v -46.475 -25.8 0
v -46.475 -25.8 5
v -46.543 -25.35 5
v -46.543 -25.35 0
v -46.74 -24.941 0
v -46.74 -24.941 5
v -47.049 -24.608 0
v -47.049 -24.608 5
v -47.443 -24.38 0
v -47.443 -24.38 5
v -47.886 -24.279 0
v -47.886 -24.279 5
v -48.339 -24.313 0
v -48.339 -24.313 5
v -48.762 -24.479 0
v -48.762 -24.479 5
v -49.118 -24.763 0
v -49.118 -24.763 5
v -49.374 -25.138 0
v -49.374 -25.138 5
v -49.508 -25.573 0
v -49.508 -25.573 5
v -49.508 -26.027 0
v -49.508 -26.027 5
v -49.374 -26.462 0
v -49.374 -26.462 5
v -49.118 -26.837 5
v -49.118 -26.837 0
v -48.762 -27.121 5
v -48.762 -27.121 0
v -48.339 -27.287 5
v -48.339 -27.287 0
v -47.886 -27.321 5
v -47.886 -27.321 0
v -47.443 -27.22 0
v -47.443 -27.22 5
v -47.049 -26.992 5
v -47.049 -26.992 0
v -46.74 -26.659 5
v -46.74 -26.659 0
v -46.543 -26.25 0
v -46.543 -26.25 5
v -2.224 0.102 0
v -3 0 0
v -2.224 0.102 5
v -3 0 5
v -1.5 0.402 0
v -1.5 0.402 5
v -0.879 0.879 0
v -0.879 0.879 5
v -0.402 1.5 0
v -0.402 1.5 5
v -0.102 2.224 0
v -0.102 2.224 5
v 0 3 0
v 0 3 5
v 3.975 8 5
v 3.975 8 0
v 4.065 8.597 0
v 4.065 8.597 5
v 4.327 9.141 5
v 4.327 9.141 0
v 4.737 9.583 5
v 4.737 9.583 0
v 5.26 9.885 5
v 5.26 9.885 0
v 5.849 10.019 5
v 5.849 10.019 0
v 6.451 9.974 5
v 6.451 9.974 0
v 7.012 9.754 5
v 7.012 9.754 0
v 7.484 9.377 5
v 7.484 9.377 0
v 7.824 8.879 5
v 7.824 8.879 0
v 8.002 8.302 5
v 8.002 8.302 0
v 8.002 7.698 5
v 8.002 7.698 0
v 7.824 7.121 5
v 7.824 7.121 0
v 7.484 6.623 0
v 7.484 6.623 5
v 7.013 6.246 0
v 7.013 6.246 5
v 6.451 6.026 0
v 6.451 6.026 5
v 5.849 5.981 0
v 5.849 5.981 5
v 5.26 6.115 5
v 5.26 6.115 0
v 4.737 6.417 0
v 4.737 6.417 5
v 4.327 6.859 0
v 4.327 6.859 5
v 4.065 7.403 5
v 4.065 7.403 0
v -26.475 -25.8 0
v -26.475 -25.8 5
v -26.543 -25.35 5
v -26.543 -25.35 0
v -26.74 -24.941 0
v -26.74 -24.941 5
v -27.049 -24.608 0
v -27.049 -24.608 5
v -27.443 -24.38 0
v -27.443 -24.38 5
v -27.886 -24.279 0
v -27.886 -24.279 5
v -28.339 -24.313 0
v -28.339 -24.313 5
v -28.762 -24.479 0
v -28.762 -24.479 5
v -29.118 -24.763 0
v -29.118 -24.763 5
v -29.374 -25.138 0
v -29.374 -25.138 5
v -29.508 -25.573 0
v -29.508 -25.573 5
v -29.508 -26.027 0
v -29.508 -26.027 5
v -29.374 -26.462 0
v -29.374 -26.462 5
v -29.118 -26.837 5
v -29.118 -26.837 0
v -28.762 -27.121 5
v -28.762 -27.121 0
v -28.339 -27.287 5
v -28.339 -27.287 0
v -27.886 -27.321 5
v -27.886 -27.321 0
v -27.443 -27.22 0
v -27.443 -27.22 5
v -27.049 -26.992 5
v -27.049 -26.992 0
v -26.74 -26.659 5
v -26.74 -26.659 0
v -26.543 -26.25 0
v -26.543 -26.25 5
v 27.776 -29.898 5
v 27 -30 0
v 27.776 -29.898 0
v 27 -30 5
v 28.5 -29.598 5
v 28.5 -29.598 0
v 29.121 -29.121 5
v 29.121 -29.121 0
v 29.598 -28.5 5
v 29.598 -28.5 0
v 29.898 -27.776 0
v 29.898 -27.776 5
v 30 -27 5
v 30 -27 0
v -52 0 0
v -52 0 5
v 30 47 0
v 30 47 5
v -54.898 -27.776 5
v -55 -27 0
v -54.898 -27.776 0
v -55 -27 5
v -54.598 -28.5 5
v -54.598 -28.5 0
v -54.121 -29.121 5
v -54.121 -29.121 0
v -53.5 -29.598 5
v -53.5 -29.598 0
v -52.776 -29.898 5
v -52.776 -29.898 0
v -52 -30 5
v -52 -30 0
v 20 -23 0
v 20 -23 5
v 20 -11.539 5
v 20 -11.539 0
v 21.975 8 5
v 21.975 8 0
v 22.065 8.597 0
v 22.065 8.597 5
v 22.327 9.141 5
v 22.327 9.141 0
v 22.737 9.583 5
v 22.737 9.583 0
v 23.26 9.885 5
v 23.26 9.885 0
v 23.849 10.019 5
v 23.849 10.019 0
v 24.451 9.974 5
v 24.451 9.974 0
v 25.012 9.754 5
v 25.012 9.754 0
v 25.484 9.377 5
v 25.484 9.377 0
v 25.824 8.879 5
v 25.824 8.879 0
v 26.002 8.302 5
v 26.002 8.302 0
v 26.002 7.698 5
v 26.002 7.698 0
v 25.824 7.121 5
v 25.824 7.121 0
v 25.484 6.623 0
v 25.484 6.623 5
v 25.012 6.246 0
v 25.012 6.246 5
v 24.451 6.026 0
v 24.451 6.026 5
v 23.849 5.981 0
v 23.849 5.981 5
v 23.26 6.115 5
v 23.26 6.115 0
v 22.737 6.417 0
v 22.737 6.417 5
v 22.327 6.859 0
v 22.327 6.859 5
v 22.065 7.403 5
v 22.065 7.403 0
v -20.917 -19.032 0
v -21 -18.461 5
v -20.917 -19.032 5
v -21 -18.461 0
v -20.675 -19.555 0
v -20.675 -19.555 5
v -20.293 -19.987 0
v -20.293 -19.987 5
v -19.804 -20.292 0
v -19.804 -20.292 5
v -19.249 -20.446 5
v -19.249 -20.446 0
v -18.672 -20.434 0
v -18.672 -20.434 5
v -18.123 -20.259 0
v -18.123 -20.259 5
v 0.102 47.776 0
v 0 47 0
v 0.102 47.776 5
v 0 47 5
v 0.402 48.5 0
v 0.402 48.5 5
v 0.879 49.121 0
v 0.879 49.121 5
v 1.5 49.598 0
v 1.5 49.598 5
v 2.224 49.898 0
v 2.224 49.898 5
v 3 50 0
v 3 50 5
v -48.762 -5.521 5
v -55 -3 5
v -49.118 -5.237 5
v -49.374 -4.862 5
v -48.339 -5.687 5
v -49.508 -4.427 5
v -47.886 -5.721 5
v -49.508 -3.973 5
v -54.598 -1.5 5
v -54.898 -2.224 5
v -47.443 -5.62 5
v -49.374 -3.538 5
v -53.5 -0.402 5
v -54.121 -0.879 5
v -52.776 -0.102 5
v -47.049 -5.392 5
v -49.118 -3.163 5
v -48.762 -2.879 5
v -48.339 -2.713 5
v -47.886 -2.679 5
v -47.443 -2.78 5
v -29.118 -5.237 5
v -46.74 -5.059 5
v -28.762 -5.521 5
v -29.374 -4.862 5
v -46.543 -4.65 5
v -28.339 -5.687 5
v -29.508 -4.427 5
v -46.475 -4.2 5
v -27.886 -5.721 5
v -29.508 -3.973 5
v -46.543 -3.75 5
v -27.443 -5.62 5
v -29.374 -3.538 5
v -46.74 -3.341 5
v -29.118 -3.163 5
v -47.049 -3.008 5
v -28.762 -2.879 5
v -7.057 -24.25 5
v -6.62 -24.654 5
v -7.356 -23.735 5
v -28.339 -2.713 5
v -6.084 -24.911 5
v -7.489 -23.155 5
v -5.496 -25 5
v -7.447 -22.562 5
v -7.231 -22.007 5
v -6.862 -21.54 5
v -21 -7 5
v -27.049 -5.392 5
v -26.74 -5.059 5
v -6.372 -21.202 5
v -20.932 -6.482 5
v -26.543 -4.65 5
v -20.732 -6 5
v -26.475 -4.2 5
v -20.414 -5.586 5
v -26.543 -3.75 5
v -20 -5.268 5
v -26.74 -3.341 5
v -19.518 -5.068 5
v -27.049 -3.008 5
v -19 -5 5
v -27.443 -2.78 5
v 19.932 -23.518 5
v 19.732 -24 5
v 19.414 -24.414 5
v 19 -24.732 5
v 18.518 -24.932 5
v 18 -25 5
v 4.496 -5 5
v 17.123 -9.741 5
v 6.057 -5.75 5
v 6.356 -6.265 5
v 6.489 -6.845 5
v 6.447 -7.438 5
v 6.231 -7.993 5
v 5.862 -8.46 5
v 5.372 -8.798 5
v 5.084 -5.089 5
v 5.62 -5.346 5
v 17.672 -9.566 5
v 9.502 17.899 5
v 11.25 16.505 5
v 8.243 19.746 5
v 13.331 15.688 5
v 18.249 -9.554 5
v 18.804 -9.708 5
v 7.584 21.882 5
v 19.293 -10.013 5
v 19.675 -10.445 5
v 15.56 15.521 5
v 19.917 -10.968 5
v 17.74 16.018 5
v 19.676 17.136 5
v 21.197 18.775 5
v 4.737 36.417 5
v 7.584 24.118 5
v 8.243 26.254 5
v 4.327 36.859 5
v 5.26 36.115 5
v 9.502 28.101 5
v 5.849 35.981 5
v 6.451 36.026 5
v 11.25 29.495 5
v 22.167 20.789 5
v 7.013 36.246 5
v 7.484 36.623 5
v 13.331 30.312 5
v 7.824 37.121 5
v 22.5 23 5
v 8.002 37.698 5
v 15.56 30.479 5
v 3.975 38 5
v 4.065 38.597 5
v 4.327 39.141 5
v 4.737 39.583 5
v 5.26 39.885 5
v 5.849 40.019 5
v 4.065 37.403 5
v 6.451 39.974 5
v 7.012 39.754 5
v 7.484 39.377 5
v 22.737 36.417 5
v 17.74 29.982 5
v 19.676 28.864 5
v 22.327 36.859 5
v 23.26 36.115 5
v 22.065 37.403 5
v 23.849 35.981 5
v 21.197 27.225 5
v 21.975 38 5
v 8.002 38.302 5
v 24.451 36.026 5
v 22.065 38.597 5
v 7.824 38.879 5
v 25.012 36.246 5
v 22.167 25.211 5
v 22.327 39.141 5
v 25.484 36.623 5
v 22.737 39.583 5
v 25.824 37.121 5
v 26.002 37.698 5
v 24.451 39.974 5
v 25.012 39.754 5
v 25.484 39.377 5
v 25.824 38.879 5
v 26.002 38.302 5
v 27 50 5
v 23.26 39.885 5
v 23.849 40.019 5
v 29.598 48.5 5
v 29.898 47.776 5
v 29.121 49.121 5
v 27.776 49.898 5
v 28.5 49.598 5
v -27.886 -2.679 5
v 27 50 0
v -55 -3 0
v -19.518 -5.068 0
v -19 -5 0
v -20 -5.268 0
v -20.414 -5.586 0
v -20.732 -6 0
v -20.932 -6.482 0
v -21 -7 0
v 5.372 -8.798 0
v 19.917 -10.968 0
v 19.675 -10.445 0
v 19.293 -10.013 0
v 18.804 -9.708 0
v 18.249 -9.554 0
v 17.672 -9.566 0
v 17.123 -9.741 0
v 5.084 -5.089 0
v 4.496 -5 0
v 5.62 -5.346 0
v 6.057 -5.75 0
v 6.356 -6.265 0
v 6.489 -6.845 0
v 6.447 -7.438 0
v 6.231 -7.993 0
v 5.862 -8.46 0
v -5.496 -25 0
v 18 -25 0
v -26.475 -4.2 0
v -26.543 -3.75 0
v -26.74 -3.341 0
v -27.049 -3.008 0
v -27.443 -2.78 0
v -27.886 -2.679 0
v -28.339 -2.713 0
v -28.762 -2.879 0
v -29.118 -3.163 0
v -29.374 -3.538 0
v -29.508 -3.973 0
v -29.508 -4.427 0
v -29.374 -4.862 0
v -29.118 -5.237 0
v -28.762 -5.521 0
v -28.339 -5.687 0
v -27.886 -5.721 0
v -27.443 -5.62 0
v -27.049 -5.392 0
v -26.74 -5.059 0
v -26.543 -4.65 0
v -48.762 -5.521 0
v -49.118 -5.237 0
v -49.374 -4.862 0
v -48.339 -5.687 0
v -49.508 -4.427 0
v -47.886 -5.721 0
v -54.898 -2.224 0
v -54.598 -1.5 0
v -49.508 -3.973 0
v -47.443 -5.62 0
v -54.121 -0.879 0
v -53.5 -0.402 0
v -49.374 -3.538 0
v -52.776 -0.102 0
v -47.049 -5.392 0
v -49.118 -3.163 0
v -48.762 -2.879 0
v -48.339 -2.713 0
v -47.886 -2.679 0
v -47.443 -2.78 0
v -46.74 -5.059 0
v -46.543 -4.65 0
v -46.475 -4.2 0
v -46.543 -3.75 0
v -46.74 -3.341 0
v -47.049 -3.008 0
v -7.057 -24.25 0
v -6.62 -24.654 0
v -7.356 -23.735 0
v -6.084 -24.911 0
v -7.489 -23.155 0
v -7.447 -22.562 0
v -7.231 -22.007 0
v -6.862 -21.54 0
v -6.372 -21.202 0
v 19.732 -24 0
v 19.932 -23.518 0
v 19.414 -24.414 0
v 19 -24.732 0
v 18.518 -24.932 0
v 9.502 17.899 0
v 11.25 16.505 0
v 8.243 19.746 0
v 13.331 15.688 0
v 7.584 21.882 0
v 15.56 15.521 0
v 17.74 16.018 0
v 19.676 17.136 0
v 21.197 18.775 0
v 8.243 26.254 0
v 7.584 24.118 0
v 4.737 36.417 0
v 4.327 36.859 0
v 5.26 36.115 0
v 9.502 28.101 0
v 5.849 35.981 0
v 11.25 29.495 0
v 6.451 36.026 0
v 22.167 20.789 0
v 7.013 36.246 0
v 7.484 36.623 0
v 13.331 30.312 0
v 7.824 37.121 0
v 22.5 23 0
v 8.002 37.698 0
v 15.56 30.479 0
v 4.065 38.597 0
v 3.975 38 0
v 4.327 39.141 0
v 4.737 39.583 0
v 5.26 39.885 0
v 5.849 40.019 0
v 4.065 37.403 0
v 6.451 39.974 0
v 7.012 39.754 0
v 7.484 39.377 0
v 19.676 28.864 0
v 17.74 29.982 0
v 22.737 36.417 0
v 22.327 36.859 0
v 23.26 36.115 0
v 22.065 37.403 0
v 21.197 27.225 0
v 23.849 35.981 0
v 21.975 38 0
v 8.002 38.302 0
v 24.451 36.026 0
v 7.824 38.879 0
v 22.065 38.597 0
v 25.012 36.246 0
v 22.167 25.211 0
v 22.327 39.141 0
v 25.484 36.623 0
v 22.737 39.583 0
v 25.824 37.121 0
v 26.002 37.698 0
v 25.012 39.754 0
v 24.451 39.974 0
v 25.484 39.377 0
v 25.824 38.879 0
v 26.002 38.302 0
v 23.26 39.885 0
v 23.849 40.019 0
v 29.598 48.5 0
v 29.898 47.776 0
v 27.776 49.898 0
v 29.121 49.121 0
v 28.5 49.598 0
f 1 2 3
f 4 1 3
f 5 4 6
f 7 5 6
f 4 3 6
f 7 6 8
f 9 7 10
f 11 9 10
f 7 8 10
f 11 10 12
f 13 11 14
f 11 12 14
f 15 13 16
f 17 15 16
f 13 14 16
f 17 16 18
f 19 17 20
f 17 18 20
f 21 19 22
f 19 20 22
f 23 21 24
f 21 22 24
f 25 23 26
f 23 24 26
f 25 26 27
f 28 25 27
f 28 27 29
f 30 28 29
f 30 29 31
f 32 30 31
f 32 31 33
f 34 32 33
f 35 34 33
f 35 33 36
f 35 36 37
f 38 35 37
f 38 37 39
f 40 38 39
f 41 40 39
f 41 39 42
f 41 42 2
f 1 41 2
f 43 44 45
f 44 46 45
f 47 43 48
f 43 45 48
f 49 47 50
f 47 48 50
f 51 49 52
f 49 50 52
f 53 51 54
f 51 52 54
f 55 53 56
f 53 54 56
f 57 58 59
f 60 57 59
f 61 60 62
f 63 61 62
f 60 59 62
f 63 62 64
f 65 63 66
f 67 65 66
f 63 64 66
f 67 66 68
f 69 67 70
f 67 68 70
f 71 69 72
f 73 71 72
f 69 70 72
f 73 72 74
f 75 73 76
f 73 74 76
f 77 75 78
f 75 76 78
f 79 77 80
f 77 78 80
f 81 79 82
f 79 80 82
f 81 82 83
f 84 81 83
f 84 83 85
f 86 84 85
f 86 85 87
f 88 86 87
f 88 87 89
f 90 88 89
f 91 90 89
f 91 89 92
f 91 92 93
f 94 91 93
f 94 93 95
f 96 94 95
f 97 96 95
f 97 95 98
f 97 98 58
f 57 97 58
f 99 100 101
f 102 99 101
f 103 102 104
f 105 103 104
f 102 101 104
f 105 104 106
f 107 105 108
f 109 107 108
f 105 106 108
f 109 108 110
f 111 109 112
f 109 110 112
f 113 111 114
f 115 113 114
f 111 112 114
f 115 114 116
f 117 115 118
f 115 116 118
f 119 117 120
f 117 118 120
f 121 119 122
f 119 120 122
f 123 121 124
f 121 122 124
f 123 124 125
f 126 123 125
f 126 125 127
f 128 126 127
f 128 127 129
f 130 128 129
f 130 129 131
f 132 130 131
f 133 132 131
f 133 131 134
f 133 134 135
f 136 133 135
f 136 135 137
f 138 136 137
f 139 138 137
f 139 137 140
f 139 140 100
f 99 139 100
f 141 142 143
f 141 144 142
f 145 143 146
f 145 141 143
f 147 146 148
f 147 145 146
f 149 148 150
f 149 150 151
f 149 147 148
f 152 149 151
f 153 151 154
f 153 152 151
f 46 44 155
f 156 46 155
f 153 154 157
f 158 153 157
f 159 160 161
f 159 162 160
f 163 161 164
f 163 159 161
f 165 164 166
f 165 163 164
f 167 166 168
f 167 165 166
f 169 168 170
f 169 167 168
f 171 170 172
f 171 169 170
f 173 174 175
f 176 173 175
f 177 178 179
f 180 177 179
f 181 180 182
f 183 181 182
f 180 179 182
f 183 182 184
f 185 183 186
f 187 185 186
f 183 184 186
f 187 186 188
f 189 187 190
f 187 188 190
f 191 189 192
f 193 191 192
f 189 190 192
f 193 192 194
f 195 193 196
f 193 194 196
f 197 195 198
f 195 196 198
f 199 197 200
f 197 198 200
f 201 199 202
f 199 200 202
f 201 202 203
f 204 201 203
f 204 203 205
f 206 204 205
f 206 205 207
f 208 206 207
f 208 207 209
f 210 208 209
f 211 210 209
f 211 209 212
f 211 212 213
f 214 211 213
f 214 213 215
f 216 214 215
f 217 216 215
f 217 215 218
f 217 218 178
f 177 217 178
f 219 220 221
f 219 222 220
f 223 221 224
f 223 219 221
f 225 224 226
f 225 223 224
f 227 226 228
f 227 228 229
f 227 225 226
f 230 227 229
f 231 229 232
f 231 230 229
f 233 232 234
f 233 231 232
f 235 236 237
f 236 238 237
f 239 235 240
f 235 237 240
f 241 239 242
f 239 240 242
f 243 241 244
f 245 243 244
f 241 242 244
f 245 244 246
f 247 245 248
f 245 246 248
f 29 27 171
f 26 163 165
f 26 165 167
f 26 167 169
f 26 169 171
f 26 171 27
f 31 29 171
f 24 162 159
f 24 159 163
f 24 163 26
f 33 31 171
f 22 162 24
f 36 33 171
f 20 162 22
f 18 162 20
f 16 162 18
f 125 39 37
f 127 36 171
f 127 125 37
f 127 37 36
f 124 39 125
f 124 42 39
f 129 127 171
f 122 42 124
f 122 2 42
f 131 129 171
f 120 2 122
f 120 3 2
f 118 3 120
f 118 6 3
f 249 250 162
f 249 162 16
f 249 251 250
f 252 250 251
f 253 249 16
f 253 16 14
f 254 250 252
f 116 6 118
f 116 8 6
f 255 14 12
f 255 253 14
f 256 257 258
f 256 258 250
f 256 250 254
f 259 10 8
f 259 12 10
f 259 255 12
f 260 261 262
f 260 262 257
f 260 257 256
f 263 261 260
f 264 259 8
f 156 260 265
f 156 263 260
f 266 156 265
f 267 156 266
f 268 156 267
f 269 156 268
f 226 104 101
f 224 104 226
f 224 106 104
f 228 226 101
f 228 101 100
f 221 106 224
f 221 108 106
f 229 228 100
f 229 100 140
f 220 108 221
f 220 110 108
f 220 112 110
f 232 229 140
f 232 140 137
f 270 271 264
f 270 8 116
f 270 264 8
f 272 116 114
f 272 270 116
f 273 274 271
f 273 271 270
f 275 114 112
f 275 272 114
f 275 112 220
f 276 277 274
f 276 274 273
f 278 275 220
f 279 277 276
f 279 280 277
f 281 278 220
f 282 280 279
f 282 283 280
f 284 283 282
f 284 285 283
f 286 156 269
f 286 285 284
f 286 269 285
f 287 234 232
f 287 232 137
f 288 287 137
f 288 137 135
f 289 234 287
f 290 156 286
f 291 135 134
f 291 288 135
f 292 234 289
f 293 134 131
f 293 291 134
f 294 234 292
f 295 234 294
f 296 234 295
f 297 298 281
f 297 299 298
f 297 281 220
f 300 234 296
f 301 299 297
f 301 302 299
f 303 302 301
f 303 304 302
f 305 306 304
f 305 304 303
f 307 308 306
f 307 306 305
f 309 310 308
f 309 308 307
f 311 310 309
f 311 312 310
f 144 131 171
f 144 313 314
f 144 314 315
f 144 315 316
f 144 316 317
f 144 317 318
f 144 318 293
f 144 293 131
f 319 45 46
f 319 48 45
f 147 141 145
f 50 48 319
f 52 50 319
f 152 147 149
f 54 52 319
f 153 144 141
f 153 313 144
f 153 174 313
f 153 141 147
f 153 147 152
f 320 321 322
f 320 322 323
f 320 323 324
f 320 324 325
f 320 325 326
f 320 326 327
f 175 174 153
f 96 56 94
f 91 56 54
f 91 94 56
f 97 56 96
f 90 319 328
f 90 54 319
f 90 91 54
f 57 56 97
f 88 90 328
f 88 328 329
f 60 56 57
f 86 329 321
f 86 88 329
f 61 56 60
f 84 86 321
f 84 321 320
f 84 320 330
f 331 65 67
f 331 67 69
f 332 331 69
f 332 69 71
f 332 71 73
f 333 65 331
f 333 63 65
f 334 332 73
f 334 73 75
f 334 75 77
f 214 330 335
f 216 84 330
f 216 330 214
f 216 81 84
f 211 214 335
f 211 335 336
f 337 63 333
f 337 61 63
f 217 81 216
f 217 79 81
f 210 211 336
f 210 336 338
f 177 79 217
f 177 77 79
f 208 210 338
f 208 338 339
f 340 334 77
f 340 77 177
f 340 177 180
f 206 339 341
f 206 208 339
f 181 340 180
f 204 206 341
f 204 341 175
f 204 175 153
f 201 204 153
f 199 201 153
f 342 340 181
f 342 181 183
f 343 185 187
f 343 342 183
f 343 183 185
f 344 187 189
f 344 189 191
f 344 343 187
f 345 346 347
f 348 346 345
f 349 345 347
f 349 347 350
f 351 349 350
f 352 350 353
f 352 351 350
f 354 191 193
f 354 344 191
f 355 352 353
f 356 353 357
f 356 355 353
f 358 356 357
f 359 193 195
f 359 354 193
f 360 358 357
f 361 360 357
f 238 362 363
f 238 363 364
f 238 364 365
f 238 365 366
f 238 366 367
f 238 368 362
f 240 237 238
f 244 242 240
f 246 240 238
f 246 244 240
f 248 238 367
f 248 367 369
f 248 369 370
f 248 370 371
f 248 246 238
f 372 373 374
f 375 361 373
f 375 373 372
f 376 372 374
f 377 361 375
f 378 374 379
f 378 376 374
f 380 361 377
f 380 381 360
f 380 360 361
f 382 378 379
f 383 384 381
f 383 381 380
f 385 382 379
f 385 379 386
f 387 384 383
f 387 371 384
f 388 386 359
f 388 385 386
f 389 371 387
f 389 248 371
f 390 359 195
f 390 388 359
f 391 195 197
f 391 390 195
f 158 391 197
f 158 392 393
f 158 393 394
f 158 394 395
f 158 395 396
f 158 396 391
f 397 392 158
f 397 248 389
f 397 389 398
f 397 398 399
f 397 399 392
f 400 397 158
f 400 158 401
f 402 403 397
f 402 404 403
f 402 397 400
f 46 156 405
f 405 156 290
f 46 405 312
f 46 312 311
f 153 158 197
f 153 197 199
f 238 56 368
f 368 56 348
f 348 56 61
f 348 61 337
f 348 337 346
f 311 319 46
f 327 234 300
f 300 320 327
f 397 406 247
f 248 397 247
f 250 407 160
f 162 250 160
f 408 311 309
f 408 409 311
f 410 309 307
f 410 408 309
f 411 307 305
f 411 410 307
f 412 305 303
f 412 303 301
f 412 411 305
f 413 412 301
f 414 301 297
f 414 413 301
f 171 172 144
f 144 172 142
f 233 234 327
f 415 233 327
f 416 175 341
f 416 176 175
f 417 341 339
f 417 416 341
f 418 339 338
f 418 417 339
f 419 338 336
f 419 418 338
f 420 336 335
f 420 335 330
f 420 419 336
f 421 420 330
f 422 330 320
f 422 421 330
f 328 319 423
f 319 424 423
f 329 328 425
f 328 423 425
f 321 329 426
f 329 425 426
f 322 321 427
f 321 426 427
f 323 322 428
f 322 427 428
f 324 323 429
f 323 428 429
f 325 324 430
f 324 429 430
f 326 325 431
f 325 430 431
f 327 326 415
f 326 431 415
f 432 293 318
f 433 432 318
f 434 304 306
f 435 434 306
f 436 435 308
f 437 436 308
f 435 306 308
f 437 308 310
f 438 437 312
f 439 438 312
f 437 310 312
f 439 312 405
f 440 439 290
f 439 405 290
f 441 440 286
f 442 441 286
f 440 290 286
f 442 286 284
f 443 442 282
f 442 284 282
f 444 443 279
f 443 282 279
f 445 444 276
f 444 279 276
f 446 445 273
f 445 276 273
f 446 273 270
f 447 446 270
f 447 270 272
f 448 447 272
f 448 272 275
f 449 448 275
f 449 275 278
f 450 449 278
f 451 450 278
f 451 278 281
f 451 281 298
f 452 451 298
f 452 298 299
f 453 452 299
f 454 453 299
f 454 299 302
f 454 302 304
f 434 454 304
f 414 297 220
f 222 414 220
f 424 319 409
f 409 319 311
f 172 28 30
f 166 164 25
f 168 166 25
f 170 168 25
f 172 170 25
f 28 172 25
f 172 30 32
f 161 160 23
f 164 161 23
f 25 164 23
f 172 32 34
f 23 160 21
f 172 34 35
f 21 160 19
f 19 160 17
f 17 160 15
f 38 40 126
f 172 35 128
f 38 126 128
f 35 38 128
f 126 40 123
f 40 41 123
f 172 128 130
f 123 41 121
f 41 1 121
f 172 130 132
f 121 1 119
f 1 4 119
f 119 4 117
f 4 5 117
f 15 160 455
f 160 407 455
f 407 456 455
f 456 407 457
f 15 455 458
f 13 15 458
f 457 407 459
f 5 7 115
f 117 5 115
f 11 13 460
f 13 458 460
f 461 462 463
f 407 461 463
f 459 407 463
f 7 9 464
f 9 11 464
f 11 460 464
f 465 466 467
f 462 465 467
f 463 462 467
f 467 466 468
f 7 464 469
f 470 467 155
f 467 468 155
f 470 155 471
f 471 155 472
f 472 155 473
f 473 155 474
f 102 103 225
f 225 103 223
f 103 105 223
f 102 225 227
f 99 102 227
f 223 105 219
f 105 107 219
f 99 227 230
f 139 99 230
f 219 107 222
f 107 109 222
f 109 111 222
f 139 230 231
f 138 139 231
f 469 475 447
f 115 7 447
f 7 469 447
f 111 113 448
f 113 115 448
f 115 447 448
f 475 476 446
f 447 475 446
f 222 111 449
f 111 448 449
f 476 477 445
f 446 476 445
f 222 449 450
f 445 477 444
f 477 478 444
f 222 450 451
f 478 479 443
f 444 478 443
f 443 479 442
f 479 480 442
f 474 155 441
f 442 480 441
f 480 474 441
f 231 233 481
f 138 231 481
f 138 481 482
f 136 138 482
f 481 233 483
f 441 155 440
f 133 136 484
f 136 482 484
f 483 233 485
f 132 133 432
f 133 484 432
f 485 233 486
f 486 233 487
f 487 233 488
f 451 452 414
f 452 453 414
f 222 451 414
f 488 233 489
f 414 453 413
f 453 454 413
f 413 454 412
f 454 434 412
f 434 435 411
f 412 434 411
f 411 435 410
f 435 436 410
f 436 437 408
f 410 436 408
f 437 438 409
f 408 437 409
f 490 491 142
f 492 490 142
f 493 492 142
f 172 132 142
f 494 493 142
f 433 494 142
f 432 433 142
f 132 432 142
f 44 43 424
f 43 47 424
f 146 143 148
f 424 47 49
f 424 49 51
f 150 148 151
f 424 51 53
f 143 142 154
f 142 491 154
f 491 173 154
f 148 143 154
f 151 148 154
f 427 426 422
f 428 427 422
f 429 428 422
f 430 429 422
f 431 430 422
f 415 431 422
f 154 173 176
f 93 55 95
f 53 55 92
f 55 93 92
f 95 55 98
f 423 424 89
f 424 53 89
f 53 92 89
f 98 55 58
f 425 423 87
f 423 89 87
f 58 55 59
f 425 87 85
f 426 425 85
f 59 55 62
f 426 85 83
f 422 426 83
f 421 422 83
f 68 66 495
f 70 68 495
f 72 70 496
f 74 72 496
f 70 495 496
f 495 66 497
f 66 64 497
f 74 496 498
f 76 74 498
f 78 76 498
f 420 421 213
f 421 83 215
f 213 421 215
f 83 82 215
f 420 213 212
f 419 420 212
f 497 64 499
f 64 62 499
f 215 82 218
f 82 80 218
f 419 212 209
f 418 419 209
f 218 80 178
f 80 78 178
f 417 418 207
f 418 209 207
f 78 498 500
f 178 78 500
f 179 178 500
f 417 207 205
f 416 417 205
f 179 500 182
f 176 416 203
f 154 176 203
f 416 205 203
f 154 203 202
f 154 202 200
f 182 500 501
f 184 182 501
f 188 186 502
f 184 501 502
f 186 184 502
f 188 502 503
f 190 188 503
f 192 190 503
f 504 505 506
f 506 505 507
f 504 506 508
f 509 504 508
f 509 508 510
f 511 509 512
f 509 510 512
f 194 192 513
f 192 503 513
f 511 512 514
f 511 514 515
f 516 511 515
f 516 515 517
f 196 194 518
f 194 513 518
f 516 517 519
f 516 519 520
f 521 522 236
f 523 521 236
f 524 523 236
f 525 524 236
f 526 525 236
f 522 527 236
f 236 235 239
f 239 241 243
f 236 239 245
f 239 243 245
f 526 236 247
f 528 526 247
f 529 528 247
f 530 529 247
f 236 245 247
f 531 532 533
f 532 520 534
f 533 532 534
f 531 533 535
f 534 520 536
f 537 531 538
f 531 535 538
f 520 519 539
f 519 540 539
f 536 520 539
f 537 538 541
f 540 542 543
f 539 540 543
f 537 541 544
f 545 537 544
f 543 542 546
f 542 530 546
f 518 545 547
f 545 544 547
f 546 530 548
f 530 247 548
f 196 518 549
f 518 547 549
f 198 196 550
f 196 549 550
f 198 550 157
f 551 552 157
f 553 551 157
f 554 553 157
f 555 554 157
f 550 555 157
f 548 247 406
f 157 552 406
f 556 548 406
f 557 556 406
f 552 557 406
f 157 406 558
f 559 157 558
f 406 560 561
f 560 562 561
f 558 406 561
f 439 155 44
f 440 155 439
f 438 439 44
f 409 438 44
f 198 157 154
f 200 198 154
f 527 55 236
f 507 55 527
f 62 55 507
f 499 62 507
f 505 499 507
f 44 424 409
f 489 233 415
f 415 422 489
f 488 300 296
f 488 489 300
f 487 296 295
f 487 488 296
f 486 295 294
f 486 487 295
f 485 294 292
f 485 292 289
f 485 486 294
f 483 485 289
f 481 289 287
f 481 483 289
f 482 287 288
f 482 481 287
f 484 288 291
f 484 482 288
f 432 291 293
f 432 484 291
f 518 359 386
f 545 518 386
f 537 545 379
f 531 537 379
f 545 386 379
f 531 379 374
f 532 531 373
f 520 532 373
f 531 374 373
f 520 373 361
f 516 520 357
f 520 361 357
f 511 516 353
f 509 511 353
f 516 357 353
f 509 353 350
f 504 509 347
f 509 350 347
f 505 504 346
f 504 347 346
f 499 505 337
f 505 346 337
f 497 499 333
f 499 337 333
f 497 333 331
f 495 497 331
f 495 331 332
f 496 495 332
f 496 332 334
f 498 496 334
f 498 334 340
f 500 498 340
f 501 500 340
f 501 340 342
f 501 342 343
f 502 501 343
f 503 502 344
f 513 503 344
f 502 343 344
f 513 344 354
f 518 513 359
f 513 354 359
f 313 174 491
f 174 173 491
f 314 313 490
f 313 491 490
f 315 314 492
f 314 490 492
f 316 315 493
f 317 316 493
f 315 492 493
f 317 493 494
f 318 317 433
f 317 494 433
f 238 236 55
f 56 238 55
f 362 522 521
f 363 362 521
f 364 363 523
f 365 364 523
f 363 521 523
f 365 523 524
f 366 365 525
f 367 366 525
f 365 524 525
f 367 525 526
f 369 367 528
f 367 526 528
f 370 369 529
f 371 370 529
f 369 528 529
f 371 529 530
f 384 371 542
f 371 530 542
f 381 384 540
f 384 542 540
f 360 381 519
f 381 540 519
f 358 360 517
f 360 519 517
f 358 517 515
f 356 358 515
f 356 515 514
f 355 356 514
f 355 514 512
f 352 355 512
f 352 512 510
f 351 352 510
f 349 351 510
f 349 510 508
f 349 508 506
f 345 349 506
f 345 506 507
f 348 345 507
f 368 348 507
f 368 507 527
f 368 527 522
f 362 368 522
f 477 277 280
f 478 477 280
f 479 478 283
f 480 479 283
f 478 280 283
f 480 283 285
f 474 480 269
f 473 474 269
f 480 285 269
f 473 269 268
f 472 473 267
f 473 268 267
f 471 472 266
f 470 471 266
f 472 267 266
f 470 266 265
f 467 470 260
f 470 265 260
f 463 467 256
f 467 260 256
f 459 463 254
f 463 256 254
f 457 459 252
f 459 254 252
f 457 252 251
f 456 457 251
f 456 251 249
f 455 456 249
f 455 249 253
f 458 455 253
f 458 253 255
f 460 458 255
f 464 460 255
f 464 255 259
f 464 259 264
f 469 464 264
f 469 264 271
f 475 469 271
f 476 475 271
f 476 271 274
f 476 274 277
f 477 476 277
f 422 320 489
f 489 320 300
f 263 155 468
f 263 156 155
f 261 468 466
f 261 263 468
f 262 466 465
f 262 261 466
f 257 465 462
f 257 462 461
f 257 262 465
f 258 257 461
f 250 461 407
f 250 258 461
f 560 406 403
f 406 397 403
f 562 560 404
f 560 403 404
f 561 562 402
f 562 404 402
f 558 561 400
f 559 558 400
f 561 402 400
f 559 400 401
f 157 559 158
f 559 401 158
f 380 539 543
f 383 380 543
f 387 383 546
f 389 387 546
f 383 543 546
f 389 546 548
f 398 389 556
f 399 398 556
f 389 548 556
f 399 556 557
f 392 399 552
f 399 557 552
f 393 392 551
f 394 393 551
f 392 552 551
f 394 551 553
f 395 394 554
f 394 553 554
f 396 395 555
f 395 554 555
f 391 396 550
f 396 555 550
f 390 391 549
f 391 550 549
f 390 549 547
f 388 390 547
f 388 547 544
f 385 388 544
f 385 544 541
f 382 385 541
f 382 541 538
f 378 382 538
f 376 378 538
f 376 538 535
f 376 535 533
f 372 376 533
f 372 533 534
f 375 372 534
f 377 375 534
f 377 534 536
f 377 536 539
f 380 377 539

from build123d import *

# Parameters (mm, degrees)
EXTRUDE_1_DEPTH          = 5
SKETCH_3_R               = 2.025
CUT_EXTRUDE_1_DEPTH      = 1
CUT_EXTRUDE_1_DEPTH_BACK = 6
FILLET_1_R               = 3
SKETCH_4_R               = 1.525
CUT_EXTRUDE_2_DEPTH      = 1
CUT_EXTRUDE_2_DEPTH_BACK = 6
CUT_EXTRUDE_3_DEPTH      = 6
FILLET_2_R               = 2
SKETCH_8_R               = 7.5
CUT_EXTRUDE_4_DEPTH      = 5


with BuildPart() as part:
    # 草图1 → 凸台-拉伸1 (new body)
    with BuildSketch(Plane.XY):
        Polygon((0, 0), (-55, 0), (-55, -30), (30, -30), (30, 50), (0, 50), align=None)
    extrude(amount=EXTRUDE_1_DEPTH)

    # 草图3 → 切除-拉伸1 (cut, two sides)
    with BuildSketch(Plane(origin=(0, 0, 0), x_dir=(-1, 0, 0), z_dir=(0, 0, -1))) as cut_extrude_1_sk:
        with Locations((-24, 38)):
            Circle(SKETCH_3_R)
        with Locations((-6, 38)):
            Circle(SKETCH_3_R)
        with Locations((-24, 8)):
            Circle(SKETCH_3_R)
        with Locations((-6, 8)):
            Circle(SKETCH_3_R)
    extrude(amount=CUT_EXTRUDE_1_DEPTH, mode=Mode.SUBTRACT)
    extrude(cut_extrude_1_sk.sketch, amount=-CUT_EXTRUDE_1_DEPTH_BACK, mode=Mode.SUBTRACT)

    # 圆角1
    fillet_1_edges = [part.edges().sort_by_distance(p)[0] for p in [
        (0, 50, 2.5),
        (30, 50, 2.5),
        (30, -30, 2.5),
        (-55, -30, 2.5),
        (-55, 0, 2.5),
        (0, 0, 2.5),
    ]]
    fillet(fillet_1_edges, radius=FILLET_1_R)

    # 草图4 → 切除-拉伸2 (cut, two sides)
    with BuildSketch(Plane.XY.offset(5)) as cut_extrude_2_sk:
        with Locations((-48, -25.8)):
            Circle(SKETCH_4_R)
        with Locations((-48, -4.2)):
            Circle(SKETCH_4_R)
        with Locations((-28, -4.2)):
            Circle(SKETCH_4_R)
        with Locations((-28, -25.8)):
            Circle(SKETCH_4_R)
    extrude(amount=CUT_EXTRUDE_2_DEPTH, mode=Mode.SUBTRACT)
    extrude(cut_extrude_2_sk.sketch, amount=-CUT_EXTRUDE_2_DEPTH_BACK, mode=Mode.SUBTRACT)

    # 草图7 → 切除-拉伸3 (cut, through all)
    with BuildSketch(Plane.XY.offset(5)):
        Polygon((13.157303163, -5), (-21, -5), (-21, -21.662099104), align=None)
        Polygon((20, -25), (20, -8.337900896), (-14.157303163, -25), align=None)
    extrude(amount=-CUT_EXTRUDE_3_DEPTH, mode=Mode.SUBTRACT)

    # 圆角2
    fillet_2_edges = [part.edges().sort_by_distance(p)[0] for p in [
        (-14.157303163, -25, 2.5),
        (20, -8.337900896, 2.5),
        (20, -25, 2.5),
        (-21, -21.662099104, 2.5),
        (-21, -5, 2.5),
        (13.157303163, -5, 2.5),
    ]]
    fillet(fillet_2_edges, radius=FILLET_2_R)

    # 草图8 → 切除-拉伸4 (cut)
    with BuildSketch(Plane.XY.offset(5)):
        with Locations((15, 23)):
            Circle(SKETCH_8_R)
    extrude(amount=-CUT_EXTRUDE_4_DEPTH, mode=Mode.SUBTRACT)


solid = part.part
